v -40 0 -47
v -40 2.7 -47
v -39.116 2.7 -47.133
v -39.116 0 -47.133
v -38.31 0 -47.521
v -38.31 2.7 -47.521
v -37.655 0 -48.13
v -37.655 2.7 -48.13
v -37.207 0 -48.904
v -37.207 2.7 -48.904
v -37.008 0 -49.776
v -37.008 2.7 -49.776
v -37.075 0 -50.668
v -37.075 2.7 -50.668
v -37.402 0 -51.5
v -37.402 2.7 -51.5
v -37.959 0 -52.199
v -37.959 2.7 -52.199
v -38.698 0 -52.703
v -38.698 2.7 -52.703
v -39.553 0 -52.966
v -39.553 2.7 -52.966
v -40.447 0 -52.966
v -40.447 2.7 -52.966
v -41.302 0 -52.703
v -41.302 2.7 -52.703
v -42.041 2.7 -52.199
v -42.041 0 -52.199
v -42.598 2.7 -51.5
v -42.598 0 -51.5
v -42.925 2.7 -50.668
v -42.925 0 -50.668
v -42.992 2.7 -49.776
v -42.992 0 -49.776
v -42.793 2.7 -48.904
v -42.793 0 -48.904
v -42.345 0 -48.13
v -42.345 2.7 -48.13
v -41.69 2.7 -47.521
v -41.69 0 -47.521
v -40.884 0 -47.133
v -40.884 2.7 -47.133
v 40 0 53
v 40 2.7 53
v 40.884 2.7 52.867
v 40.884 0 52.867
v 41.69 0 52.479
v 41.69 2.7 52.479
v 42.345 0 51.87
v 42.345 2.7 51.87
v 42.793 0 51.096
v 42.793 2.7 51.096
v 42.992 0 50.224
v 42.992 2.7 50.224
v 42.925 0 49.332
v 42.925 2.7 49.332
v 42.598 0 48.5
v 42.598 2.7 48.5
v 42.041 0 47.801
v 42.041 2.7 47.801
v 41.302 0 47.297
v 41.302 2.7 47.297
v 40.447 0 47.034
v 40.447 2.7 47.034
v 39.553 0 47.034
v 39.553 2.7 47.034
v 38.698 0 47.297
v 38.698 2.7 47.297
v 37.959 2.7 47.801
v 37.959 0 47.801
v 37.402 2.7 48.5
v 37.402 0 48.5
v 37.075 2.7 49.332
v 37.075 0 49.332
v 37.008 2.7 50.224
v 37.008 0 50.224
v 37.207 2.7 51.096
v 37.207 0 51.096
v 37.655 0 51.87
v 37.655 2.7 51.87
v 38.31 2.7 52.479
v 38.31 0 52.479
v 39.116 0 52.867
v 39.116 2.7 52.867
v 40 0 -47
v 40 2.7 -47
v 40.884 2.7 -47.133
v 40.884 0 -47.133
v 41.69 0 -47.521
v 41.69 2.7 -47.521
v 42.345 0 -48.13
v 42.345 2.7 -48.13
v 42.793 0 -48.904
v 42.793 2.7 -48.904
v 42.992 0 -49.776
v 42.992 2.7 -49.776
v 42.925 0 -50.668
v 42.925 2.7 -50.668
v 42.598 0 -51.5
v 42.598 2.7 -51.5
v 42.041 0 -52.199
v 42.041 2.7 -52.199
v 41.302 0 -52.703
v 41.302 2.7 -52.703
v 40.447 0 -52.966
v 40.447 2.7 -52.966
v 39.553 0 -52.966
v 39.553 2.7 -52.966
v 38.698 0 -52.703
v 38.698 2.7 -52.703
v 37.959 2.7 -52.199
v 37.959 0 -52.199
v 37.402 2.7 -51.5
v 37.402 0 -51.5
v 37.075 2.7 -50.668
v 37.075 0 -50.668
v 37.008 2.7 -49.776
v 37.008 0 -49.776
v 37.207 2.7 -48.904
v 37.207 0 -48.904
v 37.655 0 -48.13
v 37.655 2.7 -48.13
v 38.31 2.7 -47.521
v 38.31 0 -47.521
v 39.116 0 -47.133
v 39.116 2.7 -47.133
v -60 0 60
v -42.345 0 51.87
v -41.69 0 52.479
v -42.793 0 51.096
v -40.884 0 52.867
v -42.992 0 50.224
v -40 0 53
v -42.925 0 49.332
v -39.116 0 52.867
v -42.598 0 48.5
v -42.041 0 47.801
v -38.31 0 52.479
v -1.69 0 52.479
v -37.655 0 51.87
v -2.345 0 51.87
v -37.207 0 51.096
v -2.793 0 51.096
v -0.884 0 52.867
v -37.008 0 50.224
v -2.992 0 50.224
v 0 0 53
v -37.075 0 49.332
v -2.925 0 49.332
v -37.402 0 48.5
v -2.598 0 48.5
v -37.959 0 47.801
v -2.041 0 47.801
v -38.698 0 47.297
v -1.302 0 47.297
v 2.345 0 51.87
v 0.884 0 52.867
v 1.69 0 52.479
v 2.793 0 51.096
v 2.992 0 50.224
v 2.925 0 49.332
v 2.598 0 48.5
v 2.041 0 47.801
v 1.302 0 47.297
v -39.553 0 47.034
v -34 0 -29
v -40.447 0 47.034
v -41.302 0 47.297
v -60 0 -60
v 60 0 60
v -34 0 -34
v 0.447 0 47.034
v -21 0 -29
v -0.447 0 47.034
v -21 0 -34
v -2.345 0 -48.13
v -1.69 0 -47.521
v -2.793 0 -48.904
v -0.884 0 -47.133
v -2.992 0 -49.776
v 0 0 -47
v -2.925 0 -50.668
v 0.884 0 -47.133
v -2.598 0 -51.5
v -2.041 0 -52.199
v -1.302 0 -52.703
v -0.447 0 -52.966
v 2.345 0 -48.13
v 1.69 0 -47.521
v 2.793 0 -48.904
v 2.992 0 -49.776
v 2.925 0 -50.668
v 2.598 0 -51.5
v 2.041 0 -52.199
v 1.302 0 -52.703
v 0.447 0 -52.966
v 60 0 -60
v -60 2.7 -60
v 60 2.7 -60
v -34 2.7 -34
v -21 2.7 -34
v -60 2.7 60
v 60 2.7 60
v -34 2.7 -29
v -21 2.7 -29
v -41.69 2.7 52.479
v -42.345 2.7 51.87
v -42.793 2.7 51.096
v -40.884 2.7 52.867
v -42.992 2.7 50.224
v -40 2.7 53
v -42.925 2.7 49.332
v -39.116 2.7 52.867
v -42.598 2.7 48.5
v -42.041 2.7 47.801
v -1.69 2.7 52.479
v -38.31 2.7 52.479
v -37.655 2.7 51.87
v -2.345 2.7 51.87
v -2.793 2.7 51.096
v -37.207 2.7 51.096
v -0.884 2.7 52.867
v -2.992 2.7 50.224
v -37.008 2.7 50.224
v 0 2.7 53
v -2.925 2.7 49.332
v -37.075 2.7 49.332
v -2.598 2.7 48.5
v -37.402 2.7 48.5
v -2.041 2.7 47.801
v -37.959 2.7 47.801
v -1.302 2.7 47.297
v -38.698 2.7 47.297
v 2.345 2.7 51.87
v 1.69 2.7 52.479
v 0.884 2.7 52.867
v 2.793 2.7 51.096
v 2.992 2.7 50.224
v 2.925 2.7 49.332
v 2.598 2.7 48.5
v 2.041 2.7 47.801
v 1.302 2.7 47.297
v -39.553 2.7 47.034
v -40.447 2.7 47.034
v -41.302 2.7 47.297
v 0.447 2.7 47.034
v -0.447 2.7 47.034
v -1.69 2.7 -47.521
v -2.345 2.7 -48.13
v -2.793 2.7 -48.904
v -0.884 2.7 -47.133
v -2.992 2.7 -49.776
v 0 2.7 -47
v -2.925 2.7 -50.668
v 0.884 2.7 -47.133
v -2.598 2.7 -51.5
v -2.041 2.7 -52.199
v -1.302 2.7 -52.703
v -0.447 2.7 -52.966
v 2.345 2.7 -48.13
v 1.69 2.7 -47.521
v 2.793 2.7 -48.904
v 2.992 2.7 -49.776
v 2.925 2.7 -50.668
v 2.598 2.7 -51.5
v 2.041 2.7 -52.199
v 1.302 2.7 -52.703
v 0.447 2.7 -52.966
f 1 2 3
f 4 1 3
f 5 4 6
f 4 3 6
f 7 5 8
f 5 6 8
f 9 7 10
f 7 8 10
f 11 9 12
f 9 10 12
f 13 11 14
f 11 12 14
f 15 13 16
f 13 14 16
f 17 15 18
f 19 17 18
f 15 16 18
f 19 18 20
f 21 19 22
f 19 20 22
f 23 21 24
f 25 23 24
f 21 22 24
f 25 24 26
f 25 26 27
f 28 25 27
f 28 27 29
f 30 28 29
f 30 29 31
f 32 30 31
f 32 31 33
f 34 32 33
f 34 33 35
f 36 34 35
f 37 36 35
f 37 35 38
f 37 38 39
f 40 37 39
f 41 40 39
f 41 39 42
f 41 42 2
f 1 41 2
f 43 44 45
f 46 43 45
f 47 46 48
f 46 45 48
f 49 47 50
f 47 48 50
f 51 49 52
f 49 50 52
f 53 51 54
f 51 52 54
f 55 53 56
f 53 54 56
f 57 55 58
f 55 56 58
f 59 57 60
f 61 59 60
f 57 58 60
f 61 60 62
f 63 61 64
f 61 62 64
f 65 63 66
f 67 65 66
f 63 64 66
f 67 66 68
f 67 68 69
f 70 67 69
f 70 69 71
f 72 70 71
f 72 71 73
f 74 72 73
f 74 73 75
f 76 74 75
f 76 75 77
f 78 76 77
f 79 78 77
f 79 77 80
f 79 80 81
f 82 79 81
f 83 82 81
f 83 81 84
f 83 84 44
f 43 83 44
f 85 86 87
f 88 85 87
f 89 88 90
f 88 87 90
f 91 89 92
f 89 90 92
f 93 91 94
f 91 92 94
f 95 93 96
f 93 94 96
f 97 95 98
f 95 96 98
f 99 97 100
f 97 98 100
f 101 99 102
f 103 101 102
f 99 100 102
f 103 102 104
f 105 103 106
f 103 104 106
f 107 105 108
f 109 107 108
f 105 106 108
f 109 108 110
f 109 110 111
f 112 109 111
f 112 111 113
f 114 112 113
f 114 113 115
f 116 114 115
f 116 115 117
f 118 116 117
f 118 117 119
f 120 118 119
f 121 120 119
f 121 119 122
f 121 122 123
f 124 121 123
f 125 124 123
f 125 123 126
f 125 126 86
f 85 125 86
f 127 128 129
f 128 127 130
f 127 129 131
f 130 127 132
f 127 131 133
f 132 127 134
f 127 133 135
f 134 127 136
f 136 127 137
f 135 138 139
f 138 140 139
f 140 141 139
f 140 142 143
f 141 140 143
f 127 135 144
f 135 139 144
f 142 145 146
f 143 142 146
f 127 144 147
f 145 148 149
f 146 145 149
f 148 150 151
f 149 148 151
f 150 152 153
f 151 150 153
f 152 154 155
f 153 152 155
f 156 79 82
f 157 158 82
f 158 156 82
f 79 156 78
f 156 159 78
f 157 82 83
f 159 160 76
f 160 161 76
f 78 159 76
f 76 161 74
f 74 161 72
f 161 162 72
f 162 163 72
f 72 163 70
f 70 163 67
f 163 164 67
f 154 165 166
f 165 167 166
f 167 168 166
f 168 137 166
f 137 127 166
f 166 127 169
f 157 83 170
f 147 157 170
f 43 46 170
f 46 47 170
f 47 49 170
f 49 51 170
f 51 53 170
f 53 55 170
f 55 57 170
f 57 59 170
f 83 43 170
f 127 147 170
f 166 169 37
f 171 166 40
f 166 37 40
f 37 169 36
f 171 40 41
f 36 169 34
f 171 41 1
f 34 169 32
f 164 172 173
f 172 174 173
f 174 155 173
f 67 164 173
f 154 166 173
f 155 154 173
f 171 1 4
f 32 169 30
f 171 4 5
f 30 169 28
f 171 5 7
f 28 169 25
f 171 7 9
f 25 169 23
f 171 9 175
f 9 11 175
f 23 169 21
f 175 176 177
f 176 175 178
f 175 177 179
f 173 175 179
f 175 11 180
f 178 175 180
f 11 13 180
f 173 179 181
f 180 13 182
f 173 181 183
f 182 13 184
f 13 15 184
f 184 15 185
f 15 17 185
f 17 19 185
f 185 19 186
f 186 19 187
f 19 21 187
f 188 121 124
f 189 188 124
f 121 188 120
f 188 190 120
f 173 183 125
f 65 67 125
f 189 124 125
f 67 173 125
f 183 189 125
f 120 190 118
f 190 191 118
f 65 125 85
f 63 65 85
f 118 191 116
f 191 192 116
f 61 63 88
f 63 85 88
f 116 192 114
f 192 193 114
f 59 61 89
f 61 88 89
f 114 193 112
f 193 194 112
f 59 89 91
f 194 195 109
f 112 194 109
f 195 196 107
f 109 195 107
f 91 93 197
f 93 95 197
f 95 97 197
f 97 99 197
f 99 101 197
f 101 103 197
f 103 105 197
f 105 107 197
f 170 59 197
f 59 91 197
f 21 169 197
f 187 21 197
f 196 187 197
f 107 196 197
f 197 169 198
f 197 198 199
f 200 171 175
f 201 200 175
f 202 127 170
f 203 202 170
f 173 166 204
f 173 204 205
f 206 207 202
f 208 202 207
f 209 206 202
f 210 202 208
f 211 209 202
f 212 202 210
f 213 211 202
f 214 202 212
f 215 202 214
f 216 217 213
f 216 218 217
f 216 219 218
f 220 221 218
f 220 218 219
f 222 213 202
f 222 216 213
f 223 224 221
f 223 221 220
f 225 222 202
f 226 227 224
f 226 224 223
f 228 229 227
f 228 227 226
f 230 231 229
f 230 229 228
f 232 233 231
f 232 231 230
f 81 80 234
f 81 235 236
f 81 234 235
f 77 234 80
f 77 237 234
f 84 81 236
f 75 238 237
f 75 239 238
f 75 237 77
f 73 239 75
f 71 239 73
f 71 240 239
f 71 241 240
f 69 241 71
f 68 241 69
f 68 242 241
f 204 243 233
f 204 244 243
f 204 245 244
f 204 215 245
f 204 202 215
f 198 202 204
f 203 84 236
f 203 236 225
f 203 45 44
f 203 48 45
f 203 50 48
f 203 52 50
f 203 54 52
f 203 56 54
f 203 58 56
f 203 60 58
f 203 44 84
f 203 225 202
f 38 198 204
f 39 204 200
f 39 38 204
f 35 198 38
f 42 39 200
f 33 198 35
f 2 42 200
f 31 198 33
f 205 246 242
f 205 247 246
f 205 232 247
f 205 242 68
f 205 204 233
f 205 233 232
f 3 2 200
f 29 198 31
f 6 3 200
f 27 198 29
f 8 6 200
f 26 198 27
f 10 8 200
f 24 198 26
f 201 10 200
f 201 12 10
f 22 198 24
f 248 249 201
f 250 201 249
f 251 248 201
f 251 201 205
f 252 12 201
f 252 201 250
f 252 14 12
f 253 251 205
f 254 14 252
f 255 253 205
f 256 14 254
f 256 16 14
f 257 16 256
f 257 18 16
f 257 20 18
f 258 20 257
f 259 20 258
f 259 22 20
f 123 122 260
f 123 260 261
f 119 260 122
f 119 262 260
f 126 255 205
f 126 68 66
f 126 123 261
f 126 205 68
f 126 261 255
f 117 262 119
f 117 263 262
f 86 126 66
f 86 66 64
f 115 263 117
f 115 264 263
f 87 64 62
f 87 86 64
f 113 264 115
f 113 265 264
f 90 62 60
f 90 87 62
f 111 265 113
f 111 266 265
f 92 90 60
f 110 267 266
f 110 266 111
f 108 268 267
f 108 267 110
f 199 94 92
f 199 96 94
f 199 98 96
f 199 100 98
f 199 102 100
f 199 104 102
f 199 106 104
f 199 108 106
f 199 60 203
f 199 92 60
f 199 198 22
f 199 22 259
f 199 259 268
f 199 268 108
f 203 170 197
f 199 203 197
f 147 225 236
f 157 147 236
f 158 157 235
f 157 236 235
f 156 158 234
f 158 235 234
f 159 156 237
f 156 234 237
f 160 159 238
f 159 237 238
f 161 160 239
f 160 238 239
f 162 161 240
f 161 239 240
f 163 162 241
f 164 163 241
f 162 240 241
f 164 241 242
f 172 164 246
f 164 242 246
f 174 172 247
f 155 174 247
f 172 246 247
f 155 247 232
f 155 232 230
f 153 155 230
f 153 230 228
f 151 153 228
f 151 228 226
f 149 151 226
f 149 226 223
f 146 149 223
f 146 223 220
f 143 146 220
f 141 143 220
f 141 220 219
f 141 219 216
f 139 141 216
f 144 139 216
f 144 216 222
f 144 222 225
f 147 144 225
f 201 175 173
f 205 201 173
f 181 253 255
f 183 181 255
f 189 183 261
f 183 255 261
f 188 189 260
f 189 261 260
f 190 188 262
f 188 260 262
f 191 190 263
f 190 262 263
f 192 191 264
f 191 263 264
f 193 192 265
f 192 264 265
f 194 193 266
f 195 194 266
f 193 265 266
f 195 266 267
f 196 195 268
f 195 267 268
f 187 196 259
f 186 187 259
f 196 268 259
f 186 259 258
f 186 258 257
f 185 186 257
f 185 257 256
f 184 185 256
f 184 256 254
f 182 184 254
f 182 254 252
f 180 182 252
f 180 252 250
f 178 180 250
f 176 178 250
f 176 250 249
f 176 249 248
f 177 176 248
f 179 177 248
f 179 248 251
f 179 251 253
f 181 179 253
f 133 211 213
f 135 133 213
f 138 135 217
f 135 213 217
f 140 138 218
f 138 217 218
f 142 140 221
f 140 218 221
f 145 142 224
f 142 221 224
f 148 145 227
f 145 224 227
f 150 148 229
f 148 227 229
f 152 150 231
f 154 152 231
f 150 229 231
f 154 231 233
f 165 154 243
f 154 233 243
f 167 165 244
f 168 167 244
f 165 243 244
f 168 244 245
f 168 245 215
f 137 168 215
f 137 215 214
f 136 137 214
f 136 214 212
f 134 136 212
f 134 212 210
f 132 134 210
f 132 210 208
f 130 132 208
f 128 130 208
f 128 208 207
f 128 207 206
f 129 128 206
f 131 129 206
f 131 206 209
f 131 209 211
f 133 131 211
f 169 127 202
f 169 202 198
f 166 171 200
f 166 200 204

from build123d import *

# Parameters (mm, degrees)
CROQUIS2_W              = 120
CROQUIS2_H              = 120
SALIENTE_EXTRUIR2_DEPTH = 2.7
CROQUIS3_R              = 3
CORTAR_EXTRUIR1_DEPTH   = 85.895759611
CROQUIS4_W              = 13
CROQUIS4_H              = 5
CORTAR_EXTRUIR2_DEPTH   = 2.7


with BuildPart() as part:
    # Croquis2 → Saliente-Extruir2 (new body)
    with BuildSketch(Plane(origin=(0, 0, 0), x_dir=(1, 0, 0), z_dir=(0, 1, 0))):
        Rectangle(CROQUIS2_W, CROQUIS2_H)
    extrude(amount=SALIENTE_EXTRUIR2_DEPTH)

    # Croquis3 → Cortar-Extruir1 (cut, through all)
    with BuildSketch(Plane(origin=(0, 2.7, 0), x_dir=(1, 0, 0), z_dir=(0, 1, 0))):
        with Locations(Location((0, 50, 0), (0, 0, 270))):
            Circle(CROQUIS3_R)
        with Locations(Location((40, 50, 0), (0, 0, 270))):
            Circle(CROQUIS3_R)
        with Locations(Location((-40, 50, 0), (0, 0, 270))):
            Circle(CROQUIS3_R)
        with Locations(Location((-40, -50, 0), (0, 0, 270))):
            Circle(CROQUIS3_R)
        with Locations(Location((40, -50, 0), (0, 0, 270))):
            Circle(CROQUIS3_R)
        with Locations(Location((0, -50, 0), (0, 0, 270))):
            Circle(CROQUIS3_R)
    extrude(amount=-CORTAR_EXTRUIR1_DEPTH, mode=Mode.SUBTRACT)

    # Croquis4 → Cortar-Extruir2 (cut)
    with BuildSketch(Plane.XZ):
        with Locations((-27.5, -31.5)):
            Rectangle(CROQUIS4_W, CROQUIS4_H)
    extrude(amount=-CORTAR_EXTRUIR2_DEPTH, mode=Mode.SUBTRACT)


solid = part.part
